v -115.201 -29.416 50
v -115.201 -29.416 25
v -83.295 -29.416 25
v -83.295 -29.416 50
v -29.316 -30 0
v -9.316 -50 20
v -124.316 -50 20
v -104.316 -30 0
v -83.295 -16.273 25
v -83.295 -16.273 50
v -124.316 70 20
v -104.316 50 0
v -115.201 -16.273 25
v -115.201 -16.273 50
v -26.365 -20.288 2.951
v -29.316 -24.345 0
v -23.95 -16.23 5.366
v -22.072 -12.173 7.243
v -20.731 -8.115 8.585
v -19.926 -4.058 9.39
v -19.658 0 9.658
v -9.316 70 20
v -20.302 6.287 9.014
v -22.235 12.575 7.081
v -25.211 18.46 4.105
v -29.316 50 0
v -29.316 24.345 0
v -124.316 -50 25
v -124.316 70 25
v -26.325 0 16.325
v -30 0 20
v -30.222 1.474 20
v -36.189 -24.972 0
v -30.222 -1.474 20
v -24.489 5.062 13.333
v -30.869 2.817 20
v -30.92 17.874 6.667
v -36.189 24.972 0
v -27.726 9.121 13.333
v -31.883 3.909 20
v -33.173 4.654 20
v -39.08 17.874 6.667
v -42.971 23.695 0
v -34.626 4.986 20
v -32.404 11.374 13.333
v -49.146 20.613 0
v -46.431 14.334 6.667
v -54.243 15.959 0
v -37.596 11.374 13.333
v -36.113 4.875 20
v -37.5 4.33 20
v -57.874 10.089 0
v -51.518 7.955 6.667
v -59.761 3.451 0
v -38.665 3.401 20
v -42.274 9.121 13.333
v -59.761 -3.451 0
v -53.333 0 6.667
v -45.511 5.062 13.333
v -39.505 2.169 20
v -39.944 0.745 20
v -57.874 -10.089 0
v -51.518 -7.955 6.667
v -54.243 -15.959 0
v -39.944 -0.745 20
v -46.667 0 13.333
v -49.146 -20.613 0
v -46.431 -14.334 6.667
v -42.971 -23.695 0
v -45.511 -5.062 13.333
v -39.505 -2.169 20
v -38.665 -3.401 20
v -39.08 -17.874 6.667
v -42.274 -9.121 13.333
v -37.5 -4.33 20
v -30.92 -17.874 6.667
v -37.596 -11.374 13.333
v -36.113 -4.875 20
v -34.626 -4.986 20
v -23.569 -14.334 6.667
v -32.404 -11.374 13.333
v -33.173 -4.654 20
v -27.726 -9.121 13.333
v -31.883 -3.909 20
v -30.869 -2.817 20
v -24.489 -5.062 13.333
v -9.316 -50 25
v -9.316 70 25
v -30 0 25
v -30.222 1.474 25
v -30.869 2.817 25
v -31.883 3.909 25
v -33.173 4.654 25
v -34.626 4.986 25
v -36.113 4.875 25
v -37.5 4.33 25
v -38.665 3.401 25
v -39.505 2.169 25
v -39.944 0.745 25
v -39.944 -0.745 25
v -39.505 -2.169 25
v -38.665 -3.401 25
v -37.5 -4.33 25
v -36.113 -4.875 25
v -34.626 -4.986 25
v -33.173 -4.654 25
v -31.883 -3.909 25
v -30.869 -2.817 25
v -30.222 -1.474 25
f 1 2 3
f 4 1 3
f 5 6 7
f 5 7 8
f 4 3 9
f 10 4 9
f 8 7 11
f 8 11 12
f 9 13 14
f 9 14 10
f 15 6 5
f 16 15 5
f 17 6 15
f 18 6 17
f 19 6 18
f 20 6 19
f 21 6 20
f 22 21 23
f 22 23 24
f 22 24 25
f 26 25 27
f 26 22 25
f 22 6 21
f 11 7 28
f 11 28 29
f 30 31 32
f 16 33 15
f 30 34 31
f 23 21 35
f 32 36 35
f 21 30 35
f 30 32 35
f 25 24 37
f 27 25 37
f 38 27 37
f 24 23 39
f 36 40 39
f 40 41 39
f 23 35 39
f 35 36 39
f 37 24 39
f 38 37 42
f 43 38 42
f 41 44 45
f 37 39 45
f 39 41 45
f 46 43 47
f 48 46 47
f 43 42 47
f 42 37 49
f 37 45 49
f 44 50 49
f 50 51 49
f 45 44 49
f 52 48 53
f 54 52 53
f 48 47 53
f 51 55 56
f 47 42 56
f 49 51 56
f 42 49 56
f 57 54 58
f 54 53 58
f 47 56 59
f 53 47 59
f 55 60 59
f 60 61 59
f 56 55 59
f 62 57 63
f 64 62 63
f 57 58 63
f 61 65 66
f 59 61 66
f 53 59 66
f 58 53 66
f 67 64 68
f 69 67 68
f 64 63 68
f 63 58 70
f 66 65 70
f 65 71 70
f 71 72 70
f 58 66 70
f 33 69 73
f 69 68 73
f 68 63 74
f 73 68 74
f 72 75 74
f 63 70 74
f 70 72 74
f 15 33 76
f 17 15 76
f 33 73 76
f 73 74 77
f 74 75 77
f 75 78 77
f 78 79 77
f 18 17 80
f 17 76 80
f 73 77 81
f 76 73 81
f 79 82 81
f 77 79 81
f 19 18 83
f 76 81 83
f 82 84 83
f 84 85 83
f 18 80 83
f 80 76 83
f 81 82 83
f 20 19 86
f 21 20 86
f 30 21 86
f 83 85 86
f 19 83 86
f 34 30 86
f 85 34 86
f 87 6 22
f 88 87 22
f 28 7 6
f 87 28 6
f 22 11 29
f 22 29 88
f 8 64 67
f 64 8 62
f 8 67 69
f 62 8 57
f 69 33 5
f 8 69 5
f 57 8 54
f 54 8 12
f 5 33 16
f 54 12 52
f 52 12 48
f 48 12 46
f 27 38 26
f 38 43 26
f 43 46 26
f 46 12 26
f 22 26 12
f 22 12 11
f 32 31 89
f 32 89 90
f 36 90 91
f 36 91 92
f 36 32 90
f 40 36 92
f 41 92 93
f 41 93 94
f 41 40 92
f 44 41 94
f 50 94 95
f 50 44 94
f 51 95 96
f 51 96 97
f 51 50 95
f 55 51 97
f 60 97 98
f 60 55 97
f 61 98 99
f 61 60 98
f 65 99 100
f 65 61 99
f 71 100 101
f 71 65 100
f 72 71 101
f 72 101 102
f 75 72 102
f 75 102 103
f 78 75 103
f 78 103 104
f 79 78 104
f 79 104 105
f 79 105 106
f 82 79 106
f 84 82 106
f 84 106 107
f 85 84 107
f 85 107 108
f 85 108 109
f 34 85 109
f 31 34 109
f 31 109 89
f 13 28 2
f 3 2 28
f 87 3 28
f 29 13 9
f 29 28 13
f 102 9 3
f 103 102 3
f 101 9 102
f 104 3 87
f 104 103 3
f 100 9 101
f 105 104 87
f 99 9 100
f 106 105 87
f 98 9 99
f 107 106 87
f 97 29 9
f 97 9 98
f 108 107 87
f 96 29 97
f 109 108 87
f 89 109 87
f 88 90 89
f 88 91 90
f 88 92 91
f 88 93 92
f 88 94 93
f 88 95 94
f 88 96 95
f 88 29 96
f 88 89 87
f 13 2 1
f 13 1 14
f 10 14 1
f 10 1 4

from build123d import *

# Parameters (mm, degrees)
F0_W        = 115
F0_H        = 120
F0_R        = 5
F1_DEPTH    = 25
F2_W        = 31.9062322378
F2_H        = 13.1420847028
F3_DEPTH    = 25
F4_T1_DEPTH = 217.8673195186
F4_T3_DEPTH = 222.8673195186


# Not quite as in the source:
# - a fillet or chamfer that OpenCascade refuses, or shapes differently, is made with other operations: its cross-section is extruded or revolved along the edge and cut away or added


with BuildPart() as f1:
    # F0 (on Top) → F1 (new body)
    with BuildSketch(Plane.XY):
        with Locations((-66.8158578873, 10)):
            Rectangle(F0_W, F0_H)
        with Locations((-35, 0)):
            Circle(F0_R, mode=Mode.SUBTRACT)
    extrude(amount=F1_DEPTH)

    # F2 (on face) → F3 (join)
    with BuildSketch(Plane.XY.offset(25)):
        with Locations((-99.2479249835, -22.8444887325)):
            Rectangle(F2_W, F2_H)
    extrude(amount=F3_DEPTH)

    # F4: chamfer of 20 on 5 edges, made by hand

    # F4_s2 → F4_t1 (cut)
    with BuildSketch(Plane.YZ.offset(-175.7495176466)):
        Polygon((-50, 20), (-30, 0), (-50, 0), align=None)
        Polygon((50, 0), (70, 20), (70, 0), align=None)
    extrude(amount=F4_T1_DEPTH, mode=Mode.SUBTRACT)

    # F4_s4 → F4_t3 (cut)
    with BuildSketch(Plane.XZ.offset(-121.4336597593)):
        Polygon((-9.3158578873, 20), (-29.3158578873, 0), (-9.3158578873, 0), align=None)
        Polygon((-124.3158578873, 20), (-104.3158578873, 0), (-124.3158578873, 0), align=None)
    extrude(amount=F4_T3_DEPTH, mode=Mode.SUBTRACT)

    # F4_s5 → F4_t6 (revolve, cut)
    with BuildSketch(Plane.XZ):
        Polygon((-10, 0), (-30, 20), (-30, 0), align=None)
    revolve(axis=Axis((-35, 0, 0), (0, 0, 1)), mode=Mode.SUBTRACT)


solid = f1.part
